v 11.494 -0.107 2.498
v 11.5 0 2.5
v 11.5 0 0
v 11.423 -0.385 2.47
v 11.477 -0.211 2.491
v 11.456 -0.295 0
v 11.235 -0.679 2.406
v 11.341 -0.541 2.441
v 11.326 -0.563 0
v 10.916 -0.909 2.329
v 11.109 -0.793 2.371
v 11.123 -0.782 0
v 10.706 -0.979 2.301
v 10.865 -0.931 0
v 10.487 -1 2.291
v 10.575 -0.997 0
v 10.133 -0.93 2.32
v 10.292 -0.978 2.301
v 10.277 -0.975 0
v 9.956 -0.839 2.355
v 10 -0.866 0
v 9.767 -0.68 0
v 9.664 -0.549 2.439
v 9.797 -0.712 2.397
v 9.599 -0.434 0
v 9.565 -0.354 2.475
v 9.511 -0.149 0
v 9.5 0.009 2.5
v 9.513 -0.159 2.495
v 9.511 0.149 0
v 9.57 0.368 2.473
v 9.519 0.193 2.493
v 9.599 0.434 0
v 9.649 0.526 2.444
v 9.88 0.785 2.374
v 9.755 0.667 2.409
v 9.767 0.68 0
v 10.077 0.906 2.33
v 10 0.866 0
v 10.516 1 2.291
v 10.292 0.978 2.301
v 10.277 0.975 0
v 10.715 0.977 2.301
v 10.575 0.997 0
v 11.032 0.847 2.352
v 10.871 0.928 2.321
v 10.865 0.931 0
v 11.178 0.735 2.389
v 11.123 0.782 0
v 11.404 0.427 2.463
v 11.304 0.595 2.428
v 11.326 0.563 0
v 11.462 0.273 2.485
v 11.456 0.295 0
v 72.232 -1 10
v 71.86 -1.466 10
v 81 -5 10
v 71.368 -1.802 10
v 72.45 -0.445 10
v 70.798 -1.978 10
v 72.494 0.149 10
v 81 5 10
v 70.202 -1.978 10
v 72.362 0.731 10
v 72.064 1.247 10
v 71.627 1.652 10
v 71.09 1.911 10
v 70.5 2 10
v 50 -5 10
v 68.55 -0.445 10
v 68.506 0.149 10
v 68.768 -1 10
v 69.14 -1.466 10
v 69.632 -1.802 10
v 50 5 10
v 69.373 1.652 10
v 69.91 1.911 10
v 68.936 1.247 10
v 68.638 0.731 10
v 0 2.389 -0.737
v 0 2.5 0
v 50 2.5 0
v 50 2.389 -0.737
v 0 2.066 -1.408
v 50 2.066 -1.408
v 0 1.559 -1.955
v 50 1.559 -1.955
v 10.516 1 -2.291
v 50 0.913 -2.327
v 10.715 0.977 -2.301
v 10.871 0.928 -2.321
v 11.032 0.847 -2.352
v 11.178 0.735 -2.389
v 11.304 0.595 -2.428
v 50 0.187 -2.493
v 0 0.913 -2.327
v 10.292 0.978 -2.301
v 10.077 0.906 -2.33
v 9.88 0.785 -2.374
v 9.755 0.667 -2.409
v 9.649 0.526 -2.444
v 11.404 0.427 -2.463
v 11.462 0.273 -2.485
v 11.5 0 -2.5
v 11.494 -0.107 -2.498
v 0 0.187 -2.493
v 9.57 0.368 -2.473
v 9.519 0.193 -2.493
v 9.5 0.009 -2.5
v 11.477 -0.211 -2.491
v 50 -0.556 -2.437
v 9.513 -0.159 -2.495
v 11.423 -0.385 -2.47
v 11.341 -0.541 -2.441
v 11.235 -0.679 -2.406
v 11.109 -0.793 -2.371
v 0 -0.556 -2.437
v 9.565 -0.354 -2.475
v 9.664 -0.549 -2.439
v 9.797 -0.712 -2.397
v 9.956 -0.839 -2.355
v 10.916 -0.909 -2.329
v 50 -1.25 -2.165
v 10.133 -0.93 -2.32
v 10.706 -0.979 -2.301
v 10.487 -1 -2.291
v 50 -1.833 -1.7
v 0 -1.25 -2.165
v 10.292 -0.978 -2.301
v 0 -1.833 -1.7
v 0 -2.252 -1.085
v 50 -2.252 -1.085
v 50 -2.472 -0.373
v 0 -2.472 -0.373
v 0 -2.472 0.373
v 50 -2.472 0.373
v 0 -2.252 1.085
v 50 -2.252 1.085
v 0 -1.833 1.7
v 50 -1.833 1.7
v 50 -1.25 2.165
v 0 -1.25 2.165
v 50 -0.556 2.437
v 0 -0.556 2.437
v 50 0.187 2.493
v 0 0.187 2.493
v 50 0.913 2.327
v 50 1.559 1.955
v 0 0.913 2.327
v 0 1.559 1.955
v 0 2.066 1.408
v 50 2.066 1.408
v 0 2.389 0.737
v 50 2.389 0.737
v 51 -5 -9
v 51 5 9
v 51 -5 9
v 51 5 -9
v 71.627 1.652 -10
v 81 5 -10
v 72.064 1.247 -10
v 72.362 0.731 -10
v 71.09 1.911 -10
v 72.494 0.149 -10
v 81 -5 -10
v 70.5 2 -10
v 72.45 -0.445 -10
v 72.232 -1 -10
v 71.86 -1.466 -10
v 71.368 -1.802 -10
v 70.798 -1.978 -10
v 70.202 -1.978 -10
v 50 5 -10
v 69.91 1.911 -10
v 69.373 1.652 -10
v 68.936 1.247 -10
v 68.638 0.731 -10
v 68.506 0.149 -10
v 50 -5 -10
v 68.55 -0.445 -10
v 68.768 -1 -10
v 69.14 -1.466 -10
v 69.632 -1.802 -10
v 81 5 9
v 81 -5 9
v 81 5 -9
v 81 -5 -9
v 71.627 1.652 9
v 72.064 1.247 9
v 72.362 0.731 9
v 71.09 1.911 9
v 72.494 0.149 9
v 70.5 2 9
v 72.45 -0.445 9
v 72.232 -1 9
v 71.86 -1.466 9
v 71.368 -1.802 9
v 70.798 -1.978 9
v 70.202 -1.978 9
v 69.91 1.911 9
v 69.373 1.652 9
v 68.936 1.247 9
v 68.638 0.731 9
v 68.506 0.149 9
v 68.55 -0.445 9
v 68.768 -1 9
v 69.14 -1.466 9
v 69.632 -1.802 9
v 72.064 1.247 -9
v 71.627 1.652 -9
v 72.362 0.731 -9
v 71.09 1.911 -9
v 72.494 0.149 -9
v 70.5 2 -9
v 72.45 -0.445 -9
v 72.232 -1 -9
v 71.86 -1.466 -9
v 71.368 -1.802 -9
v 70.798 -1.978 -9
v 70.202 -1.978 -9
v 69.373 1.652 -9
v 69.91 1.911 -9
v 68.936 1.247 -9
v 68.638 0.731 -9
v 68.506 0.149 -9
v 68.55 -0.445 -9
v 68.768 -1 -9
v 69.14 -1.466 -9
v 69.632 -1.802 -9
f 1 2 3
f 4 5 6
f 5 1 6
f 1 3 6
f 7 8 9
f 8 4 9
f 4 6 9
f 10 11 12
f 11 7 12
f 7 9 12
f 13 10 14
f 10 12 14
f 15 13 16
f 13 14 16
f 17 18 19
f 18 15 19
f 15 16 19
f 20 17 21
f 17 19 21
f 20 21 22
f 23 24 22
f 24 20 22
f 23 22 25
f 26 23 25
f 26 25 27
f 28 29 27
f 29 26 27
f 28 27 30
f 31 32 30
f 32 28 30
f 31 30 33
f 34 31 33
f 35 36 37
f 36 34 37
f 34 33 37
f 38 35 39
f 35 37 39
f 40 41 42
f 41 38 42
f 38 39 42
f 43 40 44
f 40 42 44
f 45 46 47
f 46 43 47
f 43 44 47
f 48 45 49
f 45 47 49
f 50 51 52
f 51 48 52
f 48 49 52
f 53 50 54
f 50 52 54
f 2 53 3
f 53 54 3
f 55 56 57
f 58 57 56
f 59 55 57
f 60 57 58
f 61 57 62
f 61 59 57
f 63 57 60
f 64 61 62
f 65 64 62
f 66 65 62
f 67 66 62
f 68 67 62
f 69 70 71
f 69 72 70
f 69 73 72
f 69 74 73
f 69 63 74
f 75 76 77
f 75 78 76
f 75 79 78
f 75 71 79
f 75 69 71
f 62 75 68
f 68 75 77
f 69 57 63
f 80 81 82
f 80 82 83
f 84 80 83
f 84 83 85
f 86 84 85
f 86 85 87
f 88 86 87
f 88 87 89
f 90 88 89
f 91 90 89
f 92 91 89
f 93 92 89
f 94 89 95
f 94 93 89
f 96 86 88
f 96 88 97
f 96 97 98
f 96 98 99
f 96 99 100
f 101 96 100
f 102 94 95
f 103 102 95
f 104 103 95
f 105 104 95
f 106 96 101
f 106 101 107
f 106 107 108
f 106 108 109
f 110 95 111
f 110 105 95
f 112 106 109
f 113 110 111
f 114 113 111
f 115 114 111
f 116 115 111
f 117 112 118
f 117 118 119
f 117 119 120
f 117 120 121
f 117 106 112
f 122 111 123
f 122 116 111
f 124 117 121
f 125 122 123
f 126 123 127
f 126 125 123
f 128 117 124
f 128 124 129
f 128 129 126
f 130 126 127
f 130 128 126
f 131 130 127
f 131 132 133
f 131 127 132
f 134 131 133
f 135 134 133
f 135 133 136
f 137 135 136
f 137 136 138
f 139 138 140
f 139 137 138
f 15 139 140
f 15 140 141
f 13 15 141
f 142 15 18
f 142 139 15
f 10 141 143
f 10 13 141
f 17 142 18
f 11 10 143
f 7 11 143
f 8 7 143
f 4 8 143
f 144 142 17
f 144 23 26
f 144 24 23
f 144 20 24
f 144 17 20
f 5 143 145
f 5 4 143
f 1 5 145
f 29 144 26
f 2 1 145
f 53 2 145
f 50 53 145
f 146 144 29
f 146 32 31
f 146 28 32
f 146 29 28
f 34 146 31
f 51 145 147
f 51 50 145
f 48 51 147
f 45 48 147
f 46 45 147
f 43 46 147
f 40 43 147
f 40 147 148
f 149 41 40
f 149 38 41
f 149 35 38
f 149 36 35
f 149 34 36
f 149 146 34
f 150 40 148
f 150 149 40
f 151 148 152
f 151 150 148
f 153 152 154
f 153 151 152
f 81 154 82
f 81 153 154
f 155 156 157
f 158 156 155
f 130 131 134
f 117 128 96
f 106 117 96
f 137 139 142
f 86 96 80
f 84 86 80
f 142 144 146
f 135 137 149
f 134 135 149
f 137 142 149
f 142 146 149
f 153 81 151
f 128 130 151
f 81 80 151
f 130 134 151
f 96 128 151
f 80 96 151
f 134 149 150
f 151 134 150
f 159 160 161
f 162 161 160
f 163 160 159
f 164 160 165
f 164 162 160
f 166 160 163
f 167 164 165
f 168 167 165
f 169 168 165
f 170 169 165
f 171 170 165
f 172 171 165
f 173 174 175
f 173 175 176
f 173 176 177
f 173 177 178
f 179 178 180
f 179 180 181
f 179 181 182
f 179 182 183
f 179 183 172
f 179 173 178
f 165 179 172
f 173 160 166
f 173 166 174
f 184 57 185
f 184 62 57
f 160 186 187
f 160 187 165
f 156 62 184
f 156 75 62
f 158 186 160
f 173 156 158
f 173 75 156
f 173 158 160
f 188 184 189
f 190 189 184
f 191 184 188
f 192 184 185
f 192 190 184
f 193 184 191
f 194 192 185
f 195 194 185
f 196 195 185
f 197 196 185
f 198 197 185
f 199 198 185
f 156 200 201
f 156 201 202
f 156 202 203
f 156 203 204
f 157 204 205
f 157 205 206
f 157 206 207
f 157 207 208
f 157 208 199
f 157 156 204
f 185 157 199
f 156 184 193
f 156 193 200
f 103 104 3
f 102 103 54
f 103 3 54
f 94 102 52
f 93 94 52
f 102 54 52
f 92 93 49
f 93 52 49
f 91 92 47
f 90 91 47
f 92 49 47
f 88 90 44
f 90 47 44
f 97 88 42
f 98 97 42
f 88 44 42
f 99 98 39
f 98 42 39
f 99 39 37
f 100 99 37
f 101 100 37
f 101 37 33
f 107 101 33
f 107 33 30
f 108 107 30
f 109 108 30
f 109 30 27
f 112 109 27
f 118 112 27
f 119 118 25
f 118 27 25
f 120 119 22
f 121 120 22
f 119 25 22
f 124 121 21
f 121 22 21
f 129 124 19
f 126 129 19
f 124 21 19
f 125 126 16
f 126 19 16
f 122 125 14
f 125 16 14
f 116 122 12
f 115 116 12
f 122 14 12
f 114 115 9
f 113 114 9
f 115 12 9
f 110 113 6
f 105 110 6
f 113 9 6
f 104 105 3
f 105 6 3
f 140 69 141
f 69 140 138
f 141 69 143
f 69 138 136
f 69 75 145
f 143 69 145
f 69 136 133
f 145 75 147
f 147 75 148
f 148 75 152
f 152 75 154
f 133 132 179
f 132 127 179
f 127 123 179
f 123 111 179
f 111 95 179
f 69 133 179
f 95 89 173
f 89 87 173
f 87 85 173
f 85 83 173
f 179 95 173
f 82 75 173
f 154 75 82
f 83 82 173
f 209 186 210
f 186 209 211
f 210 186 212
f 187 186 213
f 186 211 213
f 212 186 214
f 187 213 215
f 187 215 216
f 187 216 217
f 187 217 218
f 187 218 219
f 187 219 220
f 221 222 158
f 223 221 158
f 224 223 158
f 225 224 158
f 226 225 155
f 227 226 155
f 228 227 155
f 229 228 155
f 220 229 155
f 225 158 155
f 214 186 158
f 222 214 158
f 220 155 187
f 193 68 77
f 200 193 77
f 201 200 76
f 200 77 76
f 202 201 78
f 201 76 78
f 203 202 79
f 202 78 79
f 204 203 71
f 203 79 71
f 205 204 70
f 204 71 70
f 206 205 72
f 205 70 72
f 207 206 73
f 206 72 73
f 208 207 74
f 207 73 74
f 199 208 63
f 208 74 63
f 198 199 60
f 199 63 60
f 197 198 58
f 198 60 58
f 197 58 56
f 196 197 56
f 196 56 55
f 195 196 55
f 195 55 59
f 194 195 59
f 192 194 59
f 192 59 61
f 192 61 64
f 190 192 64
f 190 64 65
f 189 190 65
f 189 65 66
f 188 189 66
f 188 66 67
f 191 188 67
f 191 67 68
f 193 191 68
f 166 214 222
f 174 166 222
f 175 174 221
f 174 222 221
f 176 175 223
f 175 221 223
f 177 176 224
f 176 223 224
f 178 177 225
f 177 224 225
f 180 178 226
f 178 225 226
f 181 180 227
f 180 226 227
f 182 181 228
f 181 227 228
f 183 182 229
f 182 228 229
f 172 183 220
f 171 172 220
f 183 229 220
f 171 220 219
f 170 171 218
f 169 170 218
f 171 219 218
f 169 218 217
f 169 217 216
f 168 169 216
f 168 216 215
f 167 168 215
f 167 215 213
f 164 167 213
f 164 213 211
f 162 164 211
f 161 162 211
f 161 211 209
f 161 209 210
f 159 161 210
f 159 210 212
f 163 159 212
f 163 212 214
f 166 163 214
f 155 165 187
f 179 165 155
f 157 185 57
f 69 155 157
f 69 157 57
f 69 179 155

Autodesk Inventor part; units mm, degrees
ref_plane "YZ Plane" through (0, 0, 0) normal (1, 0, 0) x (0, 1, 0)
ref_plane "XZ Plane" through (0, 0, 0) normal (0, 1, 0) x (-1, 0, 0)
ref_plane "XY Plane" through (0, 0, 0) normal (0, 0, 1) x (1, 0, 0)
sketch "草图1" plane through (0, 0, 0) normal (1, 0, 0) x (0, 1, 0)
  circle A0 centre (0, 0) radius 2.5
  dimension "杆直径" = 5
extrude "拉伸1" add sketch "草图1" along normal blind 50
sketch "草图2" plane through (50, 0, 0) normal (1, 0, 0) x (0, 0, -1)
  line L0 (10, -5) -> (-10, -5)
  line L1 (-10, -5) -> (-10, 5)
  line L2 (-10, 5) -> (10, 5)
  line L3 (10, 5) -> (10, -5)
  line L4 (10, -5) -> (-10, 5) construction
  line L5 (-10, -5) -> (10, 5) construction
  point P0 (0, 0)
  dimension "框长" = 20
  dimension "框宽" = 10
extrude "拉伸2" add sketch "草图2" along normal blind 1
sketch "草图3" plane through (51, 0, 0) normal (1, 0, 0) x (0, 0, -1)
  line L0 (-10, -5) -> (10, -5) projected
  line L1 (10, -5) -> (10, 5) projected
  line L2 (10, 5) -> (-10, 5) projected
  line L3 (-10, 5) -> (-10, -5) projected
  line L4 (-10, 5) -> (-9, 5)
  line L5 (-9, 5) -> (-9, -5)
  line L6 (10, 5) -> (9, 5)
  line L7 (9, 5) -> (9, -5)
  point P0 (0, 0)
  dimension "d7" = 1
  dimension "d8" = 1
extrude "拉伸3" add sketch "草图3" along normal blind 30 contours L3 L2 L5 L0 | L7 L2 L1 L0
hole "孔1" at (70.5, 0, -10) direction (0, 0, 1) diameter 4 end through all
sketch "草图5" plane through (0, 0, 0) normal (0, 0, 1) x (1, 0, 0)
  circle A0 centre (70.5, 0) radius 2 projected
  line L0 (50, -2.5) -> (50, 2.5) projected
  line L1 (0, 2.5) -> (0, -2.5) projected
  line L2 (70.5, 0) -> (10.5, 0)
  circle A1 centre (10.5, 0) radius 1
  point P0 (0, 0)
  dimension "高度" = 60
  dimension "销孔径" = 2
extrude "拉伸4" cut sketch "草图5" along normal mid plane 10 contours A1
properties part number "顶杆" material "木材(桦木)"
